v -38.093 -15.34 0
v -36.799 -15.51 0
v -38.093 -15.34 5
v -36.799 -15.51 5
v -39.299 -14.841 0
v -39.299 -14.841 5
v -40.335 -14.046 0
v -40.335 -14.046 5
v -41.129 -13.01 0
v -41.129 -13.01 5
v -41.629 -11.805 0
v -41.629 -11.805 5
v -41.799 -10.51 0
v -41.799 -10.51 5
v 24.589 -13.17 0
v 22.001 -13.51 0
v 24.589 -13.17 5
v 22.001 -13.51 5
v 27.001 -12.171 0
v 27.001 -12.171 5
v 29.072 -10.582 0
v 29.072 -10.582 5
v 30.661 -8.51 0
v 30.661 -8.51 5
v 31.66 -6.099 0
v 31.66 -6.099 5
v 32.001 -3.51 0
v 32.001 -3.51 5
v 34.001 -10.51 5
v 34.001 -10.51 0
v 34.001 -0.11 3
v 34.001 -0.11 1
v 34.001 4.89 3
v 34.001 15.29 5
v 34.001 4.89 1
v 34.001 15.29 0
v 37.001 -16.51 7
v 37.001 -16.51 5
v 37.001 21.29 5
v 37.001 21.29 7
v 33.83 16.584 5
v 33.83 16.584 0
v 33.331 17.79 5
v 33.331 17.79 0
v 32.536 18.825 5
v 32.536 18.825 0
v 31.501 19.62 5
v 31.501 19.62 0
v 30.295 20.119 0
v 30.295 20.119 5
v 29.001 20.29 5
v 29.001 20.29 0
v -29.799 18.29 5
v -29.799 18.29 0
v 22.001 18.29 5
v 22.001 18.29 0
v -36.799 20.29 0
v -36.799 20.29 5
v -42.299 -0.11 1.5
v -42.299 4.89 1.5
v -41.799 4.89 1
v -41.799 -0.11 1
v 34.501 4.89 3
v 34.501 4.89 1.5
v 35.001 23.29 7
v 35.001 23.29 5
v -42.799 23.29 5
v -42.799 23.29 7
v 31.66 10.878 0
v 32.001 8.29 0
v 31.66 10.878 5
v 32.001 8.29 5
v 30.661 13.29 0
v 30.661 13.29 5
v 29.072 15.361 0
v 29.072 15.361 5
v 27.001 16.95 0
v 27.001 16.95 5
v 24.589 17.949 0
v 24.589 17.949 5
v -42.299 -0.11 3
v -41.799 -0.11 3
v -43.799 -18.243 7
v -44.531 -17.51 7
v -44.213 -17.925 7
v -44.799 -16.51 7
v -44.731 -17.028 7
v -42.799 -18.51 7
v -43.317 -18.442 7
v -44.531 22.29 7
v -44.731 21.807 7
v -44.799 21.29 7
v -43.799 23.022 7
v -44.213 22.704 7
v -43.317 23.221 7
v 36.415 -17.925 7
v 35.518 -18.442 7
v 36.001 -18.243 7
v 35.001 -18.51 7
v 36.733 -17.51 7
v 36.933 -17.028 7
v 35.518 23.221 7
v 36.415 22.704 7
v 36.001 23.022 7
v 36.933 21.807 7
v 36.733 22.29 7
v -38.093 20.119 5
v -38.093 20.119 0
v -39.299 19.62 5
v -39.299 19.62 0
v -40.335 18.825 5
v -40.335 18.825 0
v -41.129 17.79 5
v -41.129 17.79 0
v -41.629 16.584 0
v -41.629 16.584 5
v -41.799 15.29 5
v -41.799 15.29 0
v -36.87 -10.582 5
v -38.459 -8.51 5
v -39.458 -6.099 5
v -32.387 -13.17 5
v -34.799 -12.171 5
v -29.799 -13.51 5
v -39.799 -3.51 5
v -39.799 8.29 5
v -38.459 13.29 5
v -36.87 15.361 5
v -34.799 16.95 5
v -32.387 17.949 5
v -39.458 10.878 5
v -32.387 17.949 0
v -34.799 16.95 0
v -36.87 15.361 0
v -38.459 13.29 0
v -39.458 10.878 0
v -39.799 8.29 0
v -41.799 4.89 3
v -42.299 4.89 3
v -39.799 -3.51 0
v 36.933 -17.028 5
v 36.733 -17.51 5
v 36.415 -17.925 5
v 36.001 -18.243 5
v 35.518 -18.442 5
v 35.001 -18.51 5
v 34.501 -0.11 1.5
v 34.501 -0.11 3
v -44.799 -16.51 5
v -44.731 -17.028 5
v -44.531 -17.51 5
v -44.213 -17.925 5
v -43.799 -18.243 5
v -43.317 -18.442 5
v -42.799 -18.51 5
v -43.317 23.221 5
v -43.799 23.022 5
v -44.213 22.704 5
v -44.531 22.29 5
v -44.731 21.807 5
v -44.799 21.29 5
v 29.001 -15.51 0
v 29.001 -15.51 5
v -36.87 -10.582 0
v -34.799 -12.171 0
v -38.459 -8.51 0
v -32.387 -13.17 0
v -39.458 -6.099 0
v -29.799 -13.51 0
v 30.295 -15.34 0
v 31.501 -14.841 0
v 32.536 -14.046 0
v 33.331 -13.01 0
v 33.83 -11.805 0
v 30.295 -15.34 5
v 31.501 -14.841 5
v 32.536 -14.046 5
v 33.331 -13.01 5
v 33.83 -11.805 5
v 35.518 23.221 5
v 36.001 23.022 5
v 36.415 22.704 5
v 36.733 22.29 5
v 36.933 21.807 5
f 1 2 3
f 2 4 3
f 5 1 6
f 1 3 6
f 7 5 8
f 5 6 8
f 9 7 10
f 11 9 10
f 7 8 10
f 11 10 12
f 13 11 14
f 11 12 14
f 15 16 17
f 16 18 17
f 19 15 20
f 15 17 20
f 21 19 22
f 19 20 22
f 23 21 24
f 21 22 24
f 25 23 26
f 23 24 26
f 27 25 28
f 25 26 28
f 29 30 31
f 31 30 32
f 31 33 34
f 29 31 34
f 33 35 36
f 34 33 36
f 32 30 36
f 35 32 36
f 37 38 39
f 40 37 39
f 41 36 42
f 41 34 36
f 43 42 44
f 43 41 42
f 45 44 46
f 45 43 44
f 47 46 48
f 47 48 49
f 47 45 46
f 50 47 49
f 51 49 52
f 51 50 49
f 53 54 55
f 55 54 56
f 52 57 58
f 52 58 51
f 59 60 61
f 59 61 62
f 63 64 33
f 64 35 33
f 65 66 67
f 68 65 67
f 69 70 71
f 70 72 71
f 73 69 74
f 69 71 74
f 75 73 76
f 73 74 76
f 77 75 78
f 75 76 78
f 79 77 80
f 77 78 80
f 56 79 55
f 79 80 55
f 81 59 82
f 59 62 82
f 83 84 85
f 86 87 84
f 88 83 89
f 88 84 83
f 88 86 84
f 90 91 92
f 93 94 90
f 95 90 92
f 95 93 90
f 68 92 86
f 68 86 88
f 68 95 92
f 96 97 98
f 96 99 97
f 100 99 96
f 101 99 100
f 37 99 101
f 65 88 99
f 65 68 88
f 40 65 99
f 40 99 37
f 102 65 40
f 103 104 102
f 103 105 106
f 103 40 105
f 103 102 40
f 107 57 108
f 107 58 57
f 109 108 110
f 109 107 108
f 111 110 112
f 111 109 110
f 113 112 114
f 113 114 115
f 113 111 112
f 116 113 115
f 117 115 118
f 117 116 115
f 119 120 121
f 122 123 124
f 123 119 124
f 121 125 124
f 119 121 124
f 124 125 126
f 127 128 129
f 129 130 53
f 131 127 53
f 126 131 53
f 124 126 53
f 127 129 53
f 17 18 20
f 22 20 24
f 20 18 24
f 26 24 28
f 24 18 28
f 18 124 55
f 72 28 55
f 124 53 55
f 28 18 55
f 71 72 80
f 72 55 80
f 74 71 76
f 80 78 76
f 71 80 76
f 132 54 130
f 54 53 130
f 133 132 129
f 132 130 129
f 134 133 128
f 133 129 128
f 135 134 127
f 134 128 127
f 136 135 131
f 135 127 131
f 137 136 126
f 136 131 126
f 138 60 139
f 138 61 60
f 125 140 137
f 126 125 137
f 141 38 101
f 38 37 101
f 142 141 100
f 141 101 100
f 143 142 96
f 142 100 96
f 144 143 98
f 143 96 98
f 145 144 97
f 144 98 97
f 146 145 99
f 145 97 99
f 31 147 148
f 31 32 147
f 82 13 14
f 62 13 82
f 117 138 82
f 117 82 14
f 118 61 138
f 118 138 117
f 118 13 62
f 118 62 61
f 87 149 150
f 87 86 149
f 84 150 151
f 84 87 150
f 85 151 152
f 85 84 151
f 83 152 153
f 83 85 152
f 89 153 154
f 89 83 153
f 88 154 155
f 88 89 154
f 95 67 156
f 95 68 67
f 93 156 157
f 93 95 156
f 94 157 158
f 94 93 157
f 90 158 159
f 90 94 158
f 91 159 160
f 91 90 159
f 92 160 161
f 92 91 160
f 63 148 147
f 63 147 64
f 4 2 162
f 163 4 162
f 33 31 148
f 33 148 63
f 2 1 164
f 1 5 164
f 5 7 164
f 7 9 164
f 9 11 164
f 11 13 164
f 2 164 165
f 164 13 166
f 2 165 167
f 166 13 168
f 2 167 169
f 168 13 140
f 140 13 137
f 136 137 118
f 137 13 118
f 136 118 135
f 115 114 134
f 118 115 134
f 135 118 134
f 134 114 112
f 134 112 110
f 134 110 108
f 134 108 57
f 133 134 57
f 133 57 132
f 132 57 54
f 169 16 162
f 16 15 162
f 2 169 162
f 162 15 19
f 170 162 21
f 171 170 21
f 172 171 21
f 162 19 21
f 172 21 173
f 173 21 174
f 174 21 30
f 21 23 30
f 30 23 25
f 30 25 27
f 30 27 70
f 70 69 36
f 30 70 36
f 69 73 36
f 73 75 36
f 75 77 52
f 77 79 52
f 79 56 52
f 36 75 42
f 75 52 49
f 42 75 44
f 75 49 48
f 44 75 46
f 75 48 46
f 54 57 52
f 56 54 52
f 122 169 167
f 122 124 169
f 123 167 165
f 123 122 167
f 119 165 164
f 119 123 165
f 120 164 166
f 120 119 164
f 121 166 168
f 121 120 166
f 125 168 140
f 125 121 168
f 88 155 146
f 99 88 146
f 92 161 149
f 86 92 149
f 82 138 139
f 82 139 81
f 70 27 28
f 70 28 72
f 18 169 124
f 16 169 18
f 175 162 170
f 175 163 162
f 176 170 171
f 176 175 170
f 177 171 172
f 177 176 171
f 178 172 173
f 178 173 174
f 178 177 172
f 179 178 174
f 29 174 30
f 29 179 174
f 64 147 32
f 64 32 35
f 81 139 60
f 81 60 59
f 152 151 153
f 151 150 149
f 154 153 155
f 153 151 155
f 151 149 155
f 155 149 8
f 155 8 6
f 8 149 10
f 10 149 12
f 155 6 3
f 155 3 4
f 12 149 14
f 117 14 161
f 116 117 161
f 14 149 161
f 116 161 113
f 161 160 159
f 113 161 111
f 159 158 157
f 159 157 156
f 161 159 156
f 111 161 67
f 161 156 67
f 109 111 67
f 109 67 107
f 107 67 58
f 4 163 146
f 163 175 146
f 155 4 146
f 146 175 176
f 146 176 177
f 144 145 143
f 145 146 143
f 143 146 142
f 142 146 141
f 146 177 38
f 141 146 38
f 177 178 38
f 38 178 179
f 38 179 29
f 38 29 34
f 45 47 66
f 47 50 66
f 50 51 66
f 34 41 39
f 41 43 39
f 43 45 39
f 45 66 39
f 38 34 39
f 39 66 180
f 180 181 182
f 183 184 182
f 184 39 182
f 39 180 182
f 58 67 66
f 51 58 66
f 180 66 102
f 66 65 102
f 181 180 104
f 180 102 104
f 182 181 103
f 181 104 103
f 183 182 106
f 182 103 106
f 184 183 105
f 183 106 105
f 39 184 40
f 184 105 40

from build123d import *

# Parameters (mm, degrees)
F0_W      = 75.8
F0_H      = 35.8
F0_W_2    = 71.8000013767
F0_H_2    = 31.8
F1_DEPTH  = 5
F2_W      = 3
F2_H      = 3
F3_DEPTH  = 2
F4_R      = 5
F5_R      = 10
F6_R      = 2
F7_W      = 5
F7_H      = 2
F8_DEPTH  = 0.5
F9_W      = 5
F9_H      = 2
F10_DEPTH = 0.5
F11_SIZE  = 0.49999


# Not quite as in the source:
# - a fillet or chamfer is up to 0.001 mm smaller than in the source, because OpenCascade refuses the exact size


with BuildPart() as f1:
    # F0 (on Top) → F1 (new body)
    with BuildSketch(Plane.XY):
        with Locations((-3.8991395473, 2.3895057946)):
            Rectangle(F0_W, F0_H)
        with Locations((-3.8991395473, 2.3895057946)):
            Rectangle(F0_W_2, F0_H_2, mode=Mode.SUBTRACT)
    extrude(amount=F1_DEPTH)

    # F2 (on face) → F3 (join)
    with BuildSketch(Plane.XY.offset(5)):
        Polygon((37.0008604527, 23.2895057946), (-44.7991395473, 23.2895057946), (-44.7991395473, -18.5104942054), (34.0008604527, -18.5104942054), (34.0008604527, -15.5104942054), (37.0008604527, -15.5104942054), align=None)
        with Locations((35.5008604527, -17.0104942054)):
            Rectangle(F2_W, F2_H)
    extrude(amount=F3_DEPTH)

    # F4
    f4_edges = [f1.edges().sort_by_distance(p)[0] for p in [
        (34.00086, 20.289506, 2.5),
        (34.00086, -15.510494, 2.5),
        (-41.79914, -15.510494, 2.5),
        (-41.79914, 20.289506, 2.5),
    ]]
    fillet(f4_edges, radius=F4_R)

    # F5
    f5_edges = [f1.edges().sort_by_distance(p)[0] for p in [
        (32.000861, -13.510494, 2.5),
        (32.000861, 18.289506, 2.5),
        (-39.79914, 18.289506, 2.5),
        (-39.79914, -13.510494, 2.5),
    ]]
    fillet(f5_edges, radius=F5_R)

    # F6
    f6_edges = [f1.edges().sort_by_distance(p)[0] for p in [
        (37.00086, -18.510494, 6),
        (37.00086, 23.289506, 6),
        (-44.79914, 23.289506, 6),
        (-44.79914, -18.510494, 6),
    ]]
    fillet(f6_edges, radius=F6_R)

    # F7 (on face) → F8 (join)
    with BuildSketch(Plane(origin=(-41.7991395473, 0, 0), x_dir=(0, -1, 0), z_dir=(-1, 0, 0))):
        with Locations((-2.3895057946, 2)):
            Rectangle(F7_W, F7_H)
    extrude(amount=F8_DEPTH)

    # F9 (on face) → F10 (join)
    with BuildSketch(Plane.YZ.offset(34.0008604527)):
        with Locations((2.3895057946, 2)):
            Rectangle(F9_W, F9_H)
    extrude(amount=F10_DEPTH)

    # F11 (size 0.5 in the source; OpenCascade refuses exactly that, so slightly less here)
    f11_edges = [f1.edges().sort_by_distance(p)[0] for p in [
        (34.50086, 2.389506, 1),
        (-42.29914, 2.389506, 1),
    ]]
    chamfer(f11_edges, length=F11_SIZE)


solid = f1.part
